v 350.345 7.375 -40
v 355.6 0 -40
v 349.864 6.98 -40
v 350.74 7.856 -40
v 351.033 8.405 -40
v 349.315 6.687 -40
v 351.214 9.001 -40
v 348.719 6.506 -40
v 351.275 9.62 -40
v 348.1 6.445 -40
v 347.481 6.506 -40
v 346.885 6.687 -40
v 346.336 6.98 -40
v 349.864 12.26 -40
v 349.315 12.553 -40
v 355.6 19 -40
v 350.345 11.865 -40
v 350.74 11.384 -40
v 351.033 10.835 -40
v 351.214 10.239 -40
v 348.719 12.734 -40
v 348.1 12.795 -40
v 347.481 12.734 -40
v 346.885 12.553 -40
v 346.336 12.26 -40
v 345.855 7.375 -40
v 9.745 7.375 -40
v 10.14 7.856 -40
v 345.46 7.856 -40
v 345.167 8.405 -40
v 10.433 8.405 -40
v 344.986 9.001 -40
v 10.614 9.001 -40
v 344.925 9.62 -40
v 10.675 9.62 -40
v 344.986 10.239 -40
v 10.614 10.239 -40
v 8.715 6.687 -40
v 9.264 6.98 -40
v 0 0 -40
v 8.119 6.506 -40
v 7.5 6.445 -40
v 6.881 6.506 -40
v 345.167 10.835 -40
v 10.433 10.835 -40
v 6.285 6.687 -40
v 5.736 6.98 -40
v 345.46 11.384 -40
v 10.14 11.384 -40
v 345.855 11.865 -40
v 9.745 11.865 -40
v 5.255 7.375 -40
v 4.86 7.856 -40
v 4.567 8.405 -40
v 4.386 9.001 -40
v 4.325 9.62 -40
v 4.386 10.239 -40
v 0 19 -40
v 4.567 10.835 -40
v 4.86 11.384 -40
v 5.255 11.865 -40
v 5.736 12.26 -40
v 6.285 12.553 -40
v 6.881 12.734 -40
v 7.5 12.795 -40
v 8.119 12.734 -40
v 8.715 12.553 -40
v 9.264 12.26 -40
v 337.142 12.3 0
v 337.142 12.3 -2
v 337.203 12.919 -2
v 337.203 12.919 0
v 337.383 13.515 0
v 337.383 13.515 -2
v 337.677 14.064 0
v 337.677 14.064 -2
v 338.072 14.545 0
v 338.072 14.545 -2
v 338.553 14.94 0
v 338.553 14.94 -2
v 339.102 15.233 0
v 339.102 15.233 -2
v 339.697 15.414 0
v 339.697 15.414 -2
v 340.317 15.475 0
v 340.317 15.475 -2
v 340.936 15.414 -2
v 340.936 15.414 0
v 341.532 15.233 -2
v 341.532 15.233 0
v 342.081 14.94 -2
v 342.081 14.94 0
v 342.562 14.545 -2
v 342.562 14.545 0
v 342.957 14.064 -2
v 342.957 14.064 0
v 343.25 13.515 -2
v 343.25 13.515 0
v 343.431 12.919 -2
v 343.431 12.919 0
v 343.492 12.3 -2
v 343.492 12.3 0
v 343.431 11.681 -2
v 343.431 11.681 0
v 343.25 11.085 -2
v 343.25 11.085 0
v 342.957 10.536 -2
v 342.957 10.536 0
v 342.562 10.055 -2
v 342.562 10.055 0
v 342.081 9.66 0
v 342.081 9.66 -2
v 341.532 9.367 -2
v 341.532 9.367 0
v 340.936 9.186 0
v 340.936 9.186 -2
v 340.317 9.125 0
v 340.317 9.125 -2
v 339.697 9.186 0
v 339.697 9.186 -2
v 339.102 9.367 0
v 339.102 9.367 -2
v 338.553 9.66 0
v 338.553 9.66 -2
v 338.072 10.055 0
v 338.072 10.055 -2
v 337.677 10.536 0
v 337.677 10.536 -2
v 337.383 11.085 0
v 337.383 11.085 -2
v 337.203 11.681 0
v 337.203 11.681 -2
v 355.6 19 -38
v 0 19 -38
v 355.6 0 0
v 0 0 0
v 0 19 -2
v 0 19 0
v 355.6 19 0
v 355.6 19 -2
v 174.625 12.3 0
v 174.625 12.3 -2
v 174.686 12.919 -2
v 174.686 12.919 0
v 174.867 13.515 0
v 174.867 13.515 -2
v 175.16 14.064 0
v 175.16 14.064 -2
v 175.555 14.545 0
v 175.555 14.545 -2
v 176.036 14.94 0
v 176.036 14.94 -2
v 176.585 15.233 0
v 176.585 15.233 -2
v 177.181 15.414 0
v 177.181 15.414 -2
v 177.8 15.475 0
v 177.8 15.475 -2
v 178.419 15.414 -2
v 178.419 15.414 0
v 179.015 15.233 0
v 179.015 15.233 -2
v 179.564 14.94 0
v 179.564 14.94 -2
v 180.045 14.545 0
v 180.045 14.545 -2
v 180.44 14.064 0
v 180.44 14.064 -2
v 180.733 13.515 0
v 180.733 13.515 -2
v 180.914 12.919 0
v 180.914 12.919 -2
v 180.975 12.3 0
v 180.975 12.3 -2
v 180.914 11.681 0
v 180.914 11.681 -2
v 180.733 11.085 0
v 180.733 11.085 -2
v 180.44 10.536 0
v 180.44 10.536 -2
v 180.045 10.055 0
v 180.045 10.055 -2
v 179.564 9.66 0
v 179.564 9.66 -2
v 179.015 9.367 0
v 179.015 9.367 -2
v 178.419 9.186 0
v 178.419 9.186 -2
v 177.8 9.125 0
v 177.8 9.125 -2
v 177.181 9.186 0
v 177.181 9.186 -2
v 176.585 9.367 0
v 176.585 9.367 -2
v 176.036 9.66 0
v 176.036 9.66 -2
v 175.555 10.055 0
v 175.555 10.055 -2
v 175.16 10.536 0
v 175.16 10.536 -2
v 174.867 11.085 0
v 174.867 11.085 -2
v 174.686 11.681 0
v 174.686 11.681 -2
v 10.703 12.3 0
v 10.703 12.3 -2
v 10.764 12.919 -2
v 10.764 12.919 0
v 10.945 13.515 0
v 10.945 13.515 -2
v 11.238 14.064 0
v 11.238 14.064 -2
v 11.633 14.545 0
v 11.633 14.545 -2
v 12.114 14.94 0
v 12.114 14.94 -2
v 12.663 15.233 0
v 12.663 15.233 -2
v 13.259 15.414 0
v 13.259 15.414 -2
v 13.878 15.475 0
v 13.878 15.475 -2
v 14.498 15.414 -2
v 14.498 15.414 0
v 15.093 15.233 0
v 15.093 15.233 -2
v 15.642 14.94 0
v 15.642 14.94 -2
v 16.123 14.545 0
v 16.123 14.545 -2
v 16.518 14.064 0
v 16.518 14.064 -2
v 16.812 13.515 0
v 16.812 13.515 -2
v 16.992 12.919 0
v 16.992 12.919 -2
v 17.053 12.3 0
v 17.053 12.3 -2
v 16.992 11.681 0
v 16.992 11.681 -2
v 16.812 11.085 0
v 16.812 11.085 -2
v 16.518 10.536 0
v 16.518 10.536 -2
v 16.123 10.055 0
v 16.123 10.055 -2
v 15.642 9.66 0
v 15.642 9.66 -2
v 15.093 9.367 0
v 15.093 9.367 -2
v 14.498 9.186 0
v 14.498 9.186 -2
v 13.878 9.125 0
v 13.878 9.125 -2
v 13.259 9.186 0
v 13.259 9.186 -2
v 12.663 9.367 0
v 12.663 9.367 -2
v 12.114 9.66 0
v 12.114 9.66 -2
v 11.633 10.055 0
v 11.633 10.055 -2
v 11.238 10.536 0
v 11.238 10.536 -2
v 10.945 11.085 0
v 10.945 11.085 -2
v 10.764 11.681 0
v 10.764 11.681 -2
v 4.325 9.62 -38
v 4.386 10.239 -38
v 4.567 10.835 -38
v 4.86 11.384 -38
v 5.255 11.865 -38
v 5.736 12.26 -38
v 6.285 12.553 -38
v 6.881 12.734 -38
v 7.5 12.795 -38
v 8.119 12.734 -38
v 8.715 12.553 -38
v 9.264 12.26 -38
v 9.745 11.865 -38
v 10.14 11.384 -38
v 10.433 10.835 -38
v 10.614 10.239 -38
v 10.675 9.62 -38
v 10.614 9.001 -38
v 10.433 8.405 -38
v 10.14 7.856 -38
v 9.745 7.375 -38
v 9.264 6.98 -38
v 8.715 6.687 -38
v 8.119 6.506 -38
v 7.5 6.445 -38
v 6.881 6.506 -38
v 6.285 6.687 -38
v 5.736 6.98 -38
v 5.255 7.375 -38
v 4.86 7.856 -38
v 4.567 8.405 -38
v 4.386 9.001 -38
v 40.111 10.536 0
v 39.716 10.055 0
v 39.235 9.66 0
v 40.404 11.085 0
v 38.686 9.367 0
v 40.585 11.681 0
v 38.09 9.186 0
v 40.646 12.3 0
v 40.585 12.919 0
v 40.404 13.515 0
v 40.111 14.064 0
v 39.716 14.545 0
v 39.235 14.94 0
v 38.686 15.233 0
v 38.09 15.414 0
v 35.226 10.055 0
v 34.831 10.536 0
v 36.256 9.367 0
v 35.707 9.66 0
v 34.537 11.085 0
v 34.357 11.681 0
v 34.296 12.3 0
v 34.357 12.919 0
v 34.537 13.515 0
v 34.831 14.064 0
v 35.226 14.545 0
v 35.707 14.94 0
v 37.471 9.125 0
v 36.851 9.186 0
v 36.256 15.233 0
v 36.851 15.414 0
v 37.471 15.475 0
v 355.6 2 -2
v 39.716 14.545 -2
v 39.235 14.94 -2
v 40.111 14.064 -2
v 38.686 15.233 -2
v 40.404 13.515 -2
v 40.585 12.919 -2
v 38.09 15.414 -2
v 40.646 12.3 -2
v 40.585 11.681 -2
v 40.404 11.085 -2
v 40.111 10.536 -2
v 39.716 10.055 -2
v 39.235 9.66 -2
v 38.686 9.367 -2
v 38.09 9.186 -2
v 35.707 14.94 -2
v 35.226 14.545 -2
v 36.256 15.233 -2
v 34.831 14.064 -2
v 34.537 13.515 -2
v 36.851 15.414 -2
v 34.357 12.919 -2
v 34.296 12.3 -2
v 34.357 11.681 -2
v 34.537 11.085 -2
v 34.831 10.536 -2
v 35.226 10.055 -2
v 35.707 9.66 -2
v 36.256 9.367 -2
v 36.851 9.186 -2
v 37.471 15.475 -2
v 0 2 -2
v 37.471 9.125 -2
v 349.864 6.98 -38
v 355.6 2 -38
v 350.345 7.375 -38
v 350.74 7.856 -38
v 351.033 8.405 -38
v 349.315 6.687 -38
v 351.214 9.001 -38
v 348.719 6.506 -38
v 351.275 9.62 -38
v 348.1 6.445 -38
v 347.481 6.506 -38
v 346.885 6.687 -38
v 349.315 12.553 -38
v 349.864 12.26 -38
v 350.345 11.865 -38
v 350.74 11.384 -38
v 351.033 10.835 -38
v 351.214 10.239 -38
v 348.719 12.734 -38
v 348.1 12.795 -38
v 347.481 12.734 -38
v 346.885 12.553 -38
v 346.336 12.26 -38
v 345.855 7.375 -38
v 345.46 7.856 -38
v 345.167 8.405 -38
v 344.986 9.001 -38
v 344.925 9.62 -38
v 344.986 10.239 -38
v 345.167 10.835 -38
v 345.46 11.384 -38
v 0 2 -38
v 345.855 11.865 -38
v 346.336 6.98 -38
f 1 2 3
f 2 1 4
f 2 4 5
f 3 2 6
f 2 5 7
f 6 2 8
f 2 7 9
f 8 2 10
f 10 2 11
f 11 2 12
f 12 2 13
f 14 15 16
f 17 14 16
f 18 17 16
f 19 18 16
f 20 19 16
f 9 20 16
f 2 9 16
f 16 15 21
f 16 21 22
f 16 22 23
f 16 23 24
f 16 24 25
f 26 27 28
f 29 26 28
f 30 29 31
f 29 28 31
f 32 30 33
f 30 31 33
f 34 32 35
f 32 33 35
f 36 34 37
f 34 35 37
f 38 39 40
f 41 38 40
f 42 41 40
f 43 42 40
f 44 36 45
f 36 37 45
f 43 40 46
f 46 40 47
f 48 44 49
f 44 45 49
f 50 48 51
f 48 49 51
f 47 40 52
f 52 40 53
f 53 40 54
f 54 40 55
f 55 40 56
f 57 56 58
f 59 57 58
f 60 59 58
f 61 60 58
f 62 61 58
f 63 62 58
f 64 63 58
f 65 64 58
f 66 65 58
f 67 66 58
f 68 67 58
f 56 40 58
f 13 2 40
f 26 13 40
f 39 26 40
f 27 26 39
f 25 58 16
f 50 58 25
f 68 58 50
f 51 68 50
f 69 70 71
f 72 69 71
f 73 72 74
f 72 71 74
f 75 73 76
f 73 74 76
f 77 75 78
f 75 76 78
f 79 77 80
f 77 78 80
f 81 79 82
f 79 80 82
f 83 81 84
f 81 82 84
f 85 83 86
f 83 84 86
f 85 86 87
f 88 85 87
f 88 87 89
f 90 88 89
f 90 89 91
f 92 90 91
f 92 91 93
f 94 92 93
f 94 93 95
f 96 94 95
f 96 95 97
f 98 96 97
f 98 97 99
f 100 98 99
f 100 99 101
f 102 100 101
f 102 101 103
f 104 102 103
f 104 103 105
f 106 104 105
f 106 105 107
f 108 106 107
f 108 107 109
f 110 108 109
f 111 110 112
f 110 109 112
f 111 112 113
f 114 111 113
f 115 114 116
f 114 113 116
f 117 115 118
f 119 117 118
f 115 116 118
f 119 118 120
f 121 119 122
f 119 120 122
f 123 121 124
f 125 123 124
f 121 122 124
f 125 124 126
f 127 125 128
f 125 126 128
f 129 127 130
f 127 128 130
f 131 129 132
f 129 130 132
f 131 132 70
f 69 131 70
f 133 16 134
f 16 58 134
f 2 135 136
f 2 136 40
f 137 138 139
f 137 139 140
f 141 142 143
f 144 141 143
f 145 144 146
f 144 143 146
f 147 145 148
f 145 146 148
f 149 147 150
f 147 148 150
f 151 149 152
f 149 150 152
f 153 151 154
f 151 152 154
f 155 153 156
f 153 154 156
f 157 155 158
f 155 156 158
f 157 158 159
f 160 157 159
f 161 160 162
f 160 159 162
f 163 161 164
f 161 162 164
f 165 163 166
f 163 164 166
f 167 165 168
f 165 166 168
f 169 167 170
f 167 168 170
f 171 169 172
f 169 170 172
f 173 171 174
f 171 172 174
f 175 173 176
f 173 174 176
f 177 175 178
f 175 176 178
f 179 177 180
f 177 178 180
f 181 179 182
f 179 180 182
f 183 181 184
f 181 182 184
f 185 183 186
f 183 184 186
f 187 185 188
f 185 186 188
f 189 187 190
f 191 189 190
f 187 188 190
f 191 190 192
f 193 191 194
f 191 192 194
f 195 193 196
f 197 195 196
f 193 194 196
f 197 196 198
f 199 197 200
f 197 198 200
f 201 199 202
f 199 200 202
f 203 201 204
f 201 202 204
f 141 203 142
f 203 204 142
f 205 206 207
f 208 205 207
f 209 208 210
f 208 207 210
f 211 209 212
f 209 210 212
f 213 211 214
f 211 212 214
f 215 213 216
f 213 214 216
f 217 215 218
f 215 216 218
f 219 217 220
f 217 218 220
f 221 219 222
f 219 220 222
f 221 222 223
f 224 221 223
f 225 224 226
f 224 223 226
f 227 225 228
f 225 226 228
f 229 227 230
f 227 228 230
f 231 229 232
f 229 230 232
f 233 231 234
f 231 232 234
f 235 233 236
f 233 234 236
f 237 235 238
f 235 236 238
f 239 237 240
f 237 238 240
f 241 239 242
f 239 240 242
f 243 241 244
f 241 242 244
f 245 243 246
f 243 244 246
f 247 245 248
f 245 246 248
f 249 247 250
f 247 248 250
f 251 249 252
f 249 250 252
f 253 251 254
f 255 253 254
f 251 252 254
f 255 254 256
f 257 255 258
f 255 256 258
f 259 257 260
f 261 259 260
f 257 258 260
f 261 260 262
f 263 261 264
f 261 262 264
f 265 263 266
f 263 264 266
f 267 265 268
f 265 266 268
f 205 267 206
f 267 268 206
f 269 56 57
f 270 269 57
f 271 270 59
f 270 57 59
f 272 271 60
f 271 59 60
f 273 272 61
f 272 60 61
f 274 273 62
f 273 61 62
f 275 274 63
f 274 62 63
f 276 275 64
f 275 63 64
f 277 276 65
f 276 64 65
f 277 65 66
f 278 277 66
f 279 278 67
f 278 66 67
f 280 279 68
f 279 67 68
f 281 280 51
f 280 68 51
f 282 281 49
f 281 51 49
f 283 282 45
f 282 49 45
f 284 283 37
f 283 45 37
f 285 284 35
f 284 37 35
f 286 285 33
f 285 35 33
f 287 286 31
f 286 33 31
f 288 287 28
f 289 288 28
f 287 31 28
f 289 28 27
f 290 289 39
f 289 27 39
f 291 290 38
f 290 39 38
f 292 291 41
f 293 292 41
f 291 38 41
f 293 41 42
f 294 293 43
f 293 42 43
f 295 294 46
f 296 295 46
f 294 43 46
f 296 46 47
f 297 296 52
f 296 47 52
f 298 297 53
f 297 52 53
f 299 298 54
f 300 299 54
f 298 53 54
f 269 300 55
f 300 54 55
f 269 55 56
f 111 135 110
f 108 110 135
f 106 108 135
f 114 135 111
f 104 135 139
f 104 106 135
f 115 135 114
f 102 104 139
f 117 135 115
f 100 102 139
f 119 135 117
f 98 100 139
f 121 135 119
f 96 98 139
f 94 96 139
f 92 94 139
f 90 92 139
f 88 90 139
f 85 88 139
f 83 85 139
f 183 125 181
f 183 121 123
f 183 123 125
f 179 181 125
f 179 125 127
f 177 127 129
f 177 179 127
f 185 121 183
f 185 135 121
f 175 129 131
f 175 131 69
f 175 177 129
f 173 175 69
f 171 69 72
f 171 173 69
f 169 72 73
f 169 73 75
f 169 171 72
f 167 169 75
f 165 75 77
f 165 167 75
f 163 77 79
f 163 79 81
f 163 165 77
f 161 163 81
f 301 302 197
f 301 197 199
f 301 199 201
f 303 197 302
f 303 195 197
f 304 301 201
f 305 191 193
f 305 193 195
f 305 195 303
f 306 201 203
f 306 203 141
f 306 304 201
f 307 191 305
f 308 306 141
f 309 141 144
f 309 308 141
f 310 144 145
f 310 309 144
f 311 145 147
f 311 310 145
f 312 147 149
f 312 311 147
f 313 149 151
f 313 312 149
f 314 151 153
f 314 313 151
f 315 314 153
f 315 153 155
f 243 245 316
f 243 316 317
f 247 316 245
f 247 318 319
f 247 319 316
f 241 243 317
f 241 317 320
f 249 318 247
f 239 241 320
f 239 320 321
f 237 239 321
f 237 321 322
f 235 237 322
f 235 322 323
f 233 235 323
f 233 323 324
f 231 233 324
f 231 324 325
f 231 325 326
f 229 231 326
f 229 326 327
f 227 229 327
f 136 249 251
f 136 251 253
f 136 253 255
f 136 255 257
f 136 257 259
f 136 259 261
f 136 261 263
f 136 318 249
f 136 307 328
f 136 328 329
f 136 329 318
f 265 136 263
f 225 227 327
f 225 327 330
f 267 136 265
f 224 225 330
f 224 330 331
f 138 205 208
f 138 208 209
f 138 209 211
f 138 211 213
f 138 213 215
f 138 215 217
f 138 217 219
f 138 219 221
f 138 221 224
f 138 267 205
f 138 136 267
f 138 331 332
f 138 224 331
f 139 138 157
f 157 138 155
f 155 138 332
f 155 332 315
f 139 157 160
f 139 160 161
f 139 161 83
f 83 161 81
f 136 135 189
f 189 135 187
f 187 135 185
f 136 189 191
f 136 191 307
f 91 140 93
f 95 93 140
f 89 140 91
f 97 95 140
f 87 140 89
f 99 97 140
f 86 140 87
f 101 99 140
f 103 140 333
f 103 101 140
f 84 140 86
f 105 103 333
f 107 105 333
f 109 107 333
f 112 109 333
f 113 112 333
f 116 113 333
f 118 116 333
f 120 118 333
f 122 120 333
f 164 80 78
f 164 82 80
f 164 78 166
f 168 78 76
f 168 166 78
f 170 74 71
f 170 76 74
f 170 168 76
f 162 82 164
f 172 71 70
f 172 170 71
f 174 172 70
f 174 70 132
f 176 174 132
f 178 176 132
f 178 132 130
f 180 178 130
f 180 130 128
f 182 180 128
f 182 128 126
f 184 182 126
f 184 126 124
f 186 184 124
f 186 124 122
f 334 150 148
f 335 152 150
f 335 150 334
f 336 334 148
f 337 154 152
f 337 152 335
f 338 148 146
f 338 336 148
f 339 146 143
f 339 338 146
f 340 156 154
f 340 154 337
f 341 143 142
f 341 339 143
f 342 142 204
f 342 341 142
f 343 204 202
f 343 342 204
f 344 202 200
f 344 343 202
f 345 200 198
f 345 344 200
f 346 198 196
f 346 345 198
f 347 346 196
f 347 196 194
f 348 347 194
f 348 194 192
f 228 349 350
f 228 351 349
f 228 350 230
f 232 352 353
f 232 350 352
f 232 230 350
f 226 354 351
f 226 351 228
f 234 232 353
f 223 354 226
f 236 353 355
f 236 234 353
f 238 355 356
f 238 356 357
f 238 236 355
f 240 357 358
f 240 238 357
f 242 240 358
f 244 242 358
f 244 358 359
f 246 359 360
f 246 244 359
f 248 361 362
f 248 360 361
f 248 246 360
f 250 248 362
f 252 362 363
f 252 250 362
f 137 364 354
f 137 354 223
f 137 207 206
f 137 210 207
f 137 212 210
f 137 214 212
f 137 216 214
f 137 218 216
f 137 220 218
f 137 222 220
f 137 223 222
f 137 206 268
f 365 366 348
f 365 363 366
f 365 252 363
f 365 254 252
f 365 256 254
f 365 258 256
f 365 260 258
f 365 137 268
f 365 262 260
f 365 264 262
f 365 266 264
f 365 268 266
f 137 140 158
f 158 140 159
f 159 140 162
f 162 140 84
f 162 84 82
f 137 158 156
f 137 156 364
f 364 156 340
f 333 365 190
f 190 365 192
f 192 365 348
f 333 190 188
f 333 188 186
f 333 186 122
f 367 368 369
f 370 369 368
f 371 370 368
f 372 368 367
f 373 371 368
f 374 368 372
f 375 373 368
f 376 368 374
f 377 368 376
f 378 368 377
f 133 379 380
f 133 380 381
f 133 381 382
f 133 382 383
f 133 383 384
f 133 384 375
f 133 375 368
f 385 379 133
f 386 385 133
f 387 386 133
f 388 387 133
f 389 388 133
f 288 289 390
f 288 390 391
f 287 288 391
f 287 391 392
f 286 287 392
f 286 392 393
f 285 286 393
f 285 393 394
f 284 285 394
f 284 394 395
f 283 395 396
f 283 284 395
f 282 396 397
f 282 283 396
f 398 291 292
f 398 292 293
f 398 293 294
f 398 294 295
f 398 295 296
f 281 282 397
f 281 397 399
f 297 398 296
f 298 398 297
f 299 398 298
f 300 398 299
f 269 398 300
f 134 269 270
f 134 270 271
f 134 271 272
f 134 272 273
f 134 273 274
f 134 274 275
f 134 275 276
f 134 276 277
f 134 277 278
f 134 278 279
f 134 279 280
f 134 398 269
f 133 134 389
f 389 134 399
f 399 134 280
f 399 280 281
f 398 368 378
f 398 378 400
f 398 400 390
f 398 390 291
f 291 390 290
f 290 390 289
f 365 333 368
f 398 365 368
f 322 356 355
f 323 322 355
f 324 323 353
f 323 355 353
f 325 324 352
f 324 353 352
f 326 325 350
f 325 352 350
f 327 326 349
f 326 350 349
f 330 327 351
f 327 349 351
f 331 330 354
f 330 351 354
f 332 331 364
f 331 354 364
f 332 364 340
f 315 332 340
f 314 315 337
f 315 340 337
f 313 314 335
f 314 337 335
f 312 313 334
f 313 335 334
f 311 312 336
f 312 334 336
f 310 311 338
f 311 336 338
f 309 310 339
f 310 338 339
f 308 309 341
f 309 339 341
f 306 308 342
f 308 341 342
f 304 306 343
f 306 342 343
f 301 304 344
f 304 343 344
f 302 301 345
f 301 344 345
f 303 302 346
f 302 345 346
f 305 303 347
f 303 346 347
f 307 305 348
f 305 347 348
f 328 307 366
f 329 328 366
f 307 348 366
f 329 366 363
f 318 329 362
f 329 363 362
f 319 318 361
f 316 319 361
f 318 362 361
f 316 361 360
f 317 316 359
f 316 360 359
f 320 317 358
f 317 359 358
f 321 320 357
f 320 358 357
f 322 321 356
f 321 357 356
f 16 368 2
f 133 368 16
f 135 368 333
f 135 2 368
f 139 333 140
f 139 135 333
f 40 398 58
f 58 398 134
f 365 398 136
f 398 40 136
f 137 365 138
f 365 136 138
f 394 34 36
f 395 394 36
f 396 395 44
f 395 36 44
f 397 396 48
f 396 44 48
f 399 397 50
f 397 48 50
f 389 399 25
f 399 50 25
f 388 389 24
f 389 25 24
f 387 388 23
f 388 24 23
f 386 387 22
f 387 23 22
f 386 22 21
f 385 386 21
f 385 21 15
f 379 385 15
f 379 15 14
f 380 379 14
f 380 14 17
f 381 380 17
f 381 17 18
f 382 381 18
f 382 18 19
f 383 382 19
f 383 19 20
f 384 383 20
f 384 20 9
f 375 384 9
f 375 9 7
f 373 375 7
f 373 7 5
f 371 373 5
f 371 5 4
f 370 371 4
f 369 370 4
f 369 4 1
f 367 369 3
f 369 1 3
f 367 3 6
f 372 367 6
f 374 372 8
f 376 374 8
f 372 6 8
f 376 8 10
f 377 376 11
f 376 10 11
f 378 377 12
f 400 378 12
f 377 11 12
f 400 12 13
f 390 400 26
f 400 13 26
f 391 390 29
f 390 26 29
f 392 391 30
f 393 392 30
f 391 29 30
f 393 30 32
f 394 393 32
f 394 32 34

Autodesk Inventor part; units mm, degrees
ref_plane "YZ Plane" through (0, 0, 0) normal (1, 0, 0) x (0, 1, 0)
ref_plane "XZ Plane" through (0, 0, 0) normal (0, 1, 0) x (-1, 0, 0)
ref_plane "XY Plane" through (0, 0, 0) normal (0, 0, 1) x (1, 0, 0)
sketch "Sketch1" plane through (0, 0, 0) normal (1, 0, 0) x (0, 1, 0)
  line L0 (0, 0) -> (0, -40)
  line L1 (0, -40) -> (19, -40)
  line L2 (19, -40) -> (19, -38)
  line L3 (0, 0) -> (19, 0)
  line L4 (19, 0) -> (19, -2)
  line L5 (0, -20) -> (2, -20) construction
  line L6 (19, -2) -> (2, -2)
  line L7 (2, -2) -> (2, -38)
  line L8 (2, -38) -> (19, -38)
  dimension "d0" = 40
  dimension "d1" = 19
  dimension "d2" = 2
  dimension "d3" = 2
  dimension "d4" = 2
extrude "Extrusion1" add sketch "Sketch1" along normal blind 355.6
sketch "Sketch2" plane through (0, 2, -2) normal (0, 0, -1) x (-1, 0, 0)
  circle A0 centre (-13.8784, 10.3) radius 3.175
  point P0 (0, -2)
extrude "Extrusion2" cut sketch "Sketch2" against normal blind 25.4
sketch "Sketch3" plane through (0, 2, -2) normal (0, 0, -1) x (-1, 0, 0)
  circle A0 centre (-13.8784, 10.3) radius 3.175
  line L0 (-355.6, 0) -> (-355.6, 17)
  line L1 (0, 17) -> (-355.6, 17)
  circle A1 centre (-37.4708, 10.3) radius 3.175
  circle A2 centre (-177.8, 10.3) radius 3.175
  circle A3 centre (-340.3166, 10.3) radius 3.175
  point P0 (0, -2)
  dimension "d9" = 6.35
  dimension "d10" = 6.35
  dimension "d11" = 6.35
extrude "Extrusion3" cut sketch "Sketch3" against normal blind 25.4 contours A1 | A2 | A3
sketch "Sketch4" plane through (0, 0, -40) normal (0, 0, -1) x (-1, 0, 0)
  circle A0 centre (-348.1, 9.62) radius 3.175
  circle A1 centre (-7.5, 9.62) radius 3.175
extrude "Extrusion4" cut sketch "Sketch4" against normal blind 25.4
properties part number "26in C-Channel (TopPlate Supports)" material "Aluminum 6061"
